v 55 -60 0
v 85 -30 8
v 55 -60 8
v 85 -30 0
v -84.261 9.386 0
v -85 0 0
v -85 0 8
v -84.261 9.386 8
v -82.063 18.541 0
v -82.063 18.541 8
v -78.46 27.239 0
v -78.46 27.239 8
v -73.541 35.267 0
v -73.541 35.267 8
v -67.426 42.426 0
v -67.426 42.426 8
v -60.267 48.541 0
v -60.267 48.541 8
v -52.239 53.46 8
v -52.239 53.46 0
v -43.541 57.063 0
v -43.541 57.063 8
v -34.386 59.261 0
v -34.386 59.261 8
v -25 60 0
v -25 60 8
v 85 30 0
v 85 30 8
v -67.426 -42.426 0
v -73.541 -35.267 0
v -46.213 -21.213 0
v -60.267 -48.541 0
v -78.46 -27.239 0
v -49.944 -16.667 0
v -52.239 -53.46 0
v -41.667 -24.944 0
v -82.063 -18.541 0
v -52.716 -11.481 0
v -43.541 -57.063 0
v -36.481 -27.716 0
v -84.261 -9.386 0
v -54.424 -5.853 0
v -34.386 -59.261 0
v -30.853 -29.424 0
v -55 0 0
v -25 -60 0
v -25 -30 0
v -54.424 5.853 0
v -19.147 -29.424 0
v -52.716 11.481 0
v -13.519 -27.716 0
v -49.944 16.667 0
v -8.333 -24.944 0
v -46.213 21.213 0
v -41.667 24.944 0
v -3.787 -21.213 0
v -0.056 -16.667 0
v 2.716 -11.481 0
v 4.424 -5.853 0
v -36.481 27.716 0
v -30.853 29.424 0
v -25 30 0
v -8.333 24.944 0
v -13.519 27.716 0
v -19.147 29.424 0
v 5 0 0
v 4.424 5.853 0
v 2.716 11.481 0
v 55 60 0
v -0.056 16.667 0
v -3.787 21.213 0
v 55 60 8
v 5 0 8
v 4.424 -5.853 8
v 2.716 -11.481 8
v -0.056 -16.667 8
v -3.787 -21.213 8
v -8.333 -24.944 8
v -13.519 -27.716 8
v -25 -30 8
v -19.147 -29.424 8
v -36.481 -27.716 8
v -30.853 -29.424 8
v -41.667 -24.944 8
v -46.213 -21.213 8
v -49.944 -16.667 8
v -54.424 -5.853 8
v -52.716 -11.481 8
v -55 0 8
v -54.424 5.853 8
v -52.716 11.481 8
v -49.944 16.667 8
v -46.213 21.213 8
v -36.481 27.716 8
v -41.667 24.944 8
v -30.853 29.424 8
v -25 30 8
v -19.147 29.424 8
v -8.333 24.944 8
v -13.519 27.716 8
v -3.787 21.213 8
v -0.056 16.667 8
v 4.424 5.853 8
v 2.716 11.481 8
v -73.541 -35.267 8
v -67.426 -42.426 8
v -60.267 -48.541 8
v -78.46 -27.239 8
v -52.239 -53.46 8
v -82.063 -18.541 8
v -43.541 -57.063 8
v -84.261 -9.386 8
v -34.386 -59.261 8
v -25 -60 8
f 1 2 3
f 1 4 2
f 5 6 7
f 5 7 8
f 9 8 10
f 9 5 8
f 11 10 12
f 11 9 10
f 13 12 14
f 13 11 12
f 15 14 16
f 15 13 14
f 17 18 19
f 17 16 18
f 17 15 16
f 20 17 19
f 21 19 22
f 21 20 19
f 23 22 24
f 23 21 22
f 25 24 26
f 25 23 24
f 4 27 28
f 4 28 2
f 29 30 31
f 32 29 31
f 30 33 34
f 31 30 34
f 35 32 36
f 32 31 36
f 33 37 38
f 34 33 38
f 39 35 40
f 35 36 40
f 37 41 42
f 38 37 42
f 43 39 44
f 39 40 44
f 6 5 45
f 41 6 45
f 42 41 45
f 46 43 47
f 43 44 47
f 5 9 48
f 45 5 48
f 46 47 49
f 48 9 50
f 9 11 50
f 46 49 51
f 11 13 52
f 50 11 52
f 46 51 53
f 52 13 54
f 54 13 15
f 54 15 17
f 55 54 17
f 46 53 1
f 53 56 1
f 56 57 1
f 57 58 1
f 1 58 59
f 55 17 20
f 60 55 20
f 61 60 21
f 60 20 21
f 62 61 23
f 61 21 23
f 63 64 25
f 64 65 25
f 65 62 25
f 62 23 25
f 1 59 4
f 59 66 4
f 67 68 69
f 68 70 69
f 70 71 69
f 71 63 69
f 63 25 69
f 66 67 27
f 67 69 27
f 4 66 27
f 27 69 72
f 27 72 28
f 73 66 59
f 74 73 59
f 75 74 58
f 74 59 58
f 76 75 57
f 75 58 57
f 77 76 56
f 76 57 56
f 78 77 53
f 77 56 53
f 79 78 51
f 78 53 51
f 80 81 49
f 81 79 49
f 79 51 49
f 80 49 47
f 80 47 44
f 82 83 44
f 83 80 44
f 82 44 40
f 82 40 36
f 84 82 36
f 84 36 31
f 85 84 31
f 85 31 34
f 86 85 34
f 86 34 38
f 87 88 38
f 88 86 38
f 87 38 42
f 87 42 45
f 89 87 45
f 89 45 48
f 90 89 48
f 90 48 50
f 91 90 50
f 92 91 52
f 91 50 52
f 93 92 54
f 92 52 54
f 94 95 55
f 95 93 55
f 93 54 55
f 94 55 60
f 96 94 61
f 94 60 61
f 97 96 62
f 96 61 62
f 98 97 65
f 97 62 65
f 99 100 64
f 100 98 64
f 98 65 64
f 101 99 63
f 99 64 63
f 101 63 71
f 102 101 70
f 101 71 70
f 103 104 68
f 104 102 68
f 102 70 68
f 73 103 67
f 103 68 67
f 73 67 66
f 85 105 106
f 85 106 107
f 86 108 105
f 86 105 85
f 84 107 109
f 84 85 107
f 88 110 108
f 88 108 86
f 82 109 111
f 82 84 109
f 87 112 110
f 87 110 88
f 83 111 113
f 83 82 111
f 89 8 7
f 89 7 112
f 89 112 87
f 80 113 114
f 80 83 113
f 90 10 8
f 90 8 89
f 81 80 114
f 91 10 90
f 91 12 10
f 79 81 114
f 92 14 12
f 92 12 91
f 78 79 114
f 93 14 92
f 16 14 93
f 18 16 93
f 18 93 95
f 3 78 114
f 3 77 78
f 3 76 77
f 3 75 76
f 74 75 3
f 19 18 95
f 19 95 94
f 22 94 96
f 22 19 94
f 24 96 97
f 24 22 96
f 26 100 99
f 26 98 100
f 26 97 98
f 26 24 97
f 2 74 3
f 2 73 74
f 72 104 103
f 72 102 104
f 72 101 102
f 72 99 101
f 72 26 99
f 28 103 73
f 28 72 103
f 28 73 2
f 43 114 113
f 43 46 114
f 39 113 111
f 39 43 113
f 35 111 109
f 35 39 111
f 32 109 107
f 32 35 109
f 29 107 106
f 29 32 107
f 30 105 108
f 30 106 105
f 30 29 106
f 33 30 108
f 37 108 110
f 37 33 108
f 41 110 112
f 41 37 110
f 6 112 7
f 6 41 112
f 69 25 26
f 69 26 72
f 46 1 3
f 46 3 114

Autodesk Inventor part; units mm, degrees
ref_plane "YZ Plane" through (0, 0, 0) normal (1, 0, 0) x (0, 1, 0)
ref_plane "XZ Plane" through (0, 0, 0) normal (0, 1, 0) x (-1, 0, 0)
ref_plane "XY Plane" through (0, 0, 0) normal (0, 0, 1) x (1, 0, 0)
sketch "Sketch1" plane through (0, 0, 0) normal (0, 0, 1) x (1, 0, 0)
  line L0 (-85, 60) -> (85, 60)
  line L1 (85, 60) -> (85, -60)
  line L2 (85, -60) -> (-85, -60)
  line L3 (-85, -60) -> (-85, 60)
  line L4 (-85, 60) -> (85, -60) construction
  line L5 (85, 60) -> (-85, -60) construction
  circle A0 centre (-25, 0) radius 30
  line L6 (0, 60) -> (0, -60) construction
  arc A1 (-25, 60) -> (-25, -60) centre (-25, 0) ccw
  line L7 (55, 60) -> (85, 30)
  line L8 (85, -30) -> (55, -60)
  point P0 (0, 0)
  point P1 (-85, 0)
  dimension "d0" = 170
  dimension "d1" = 120
  dimension "d13" = 60
  dimension "d14" = 60
  dimension "d15" = 30
  dimension "d17" = 45
extrude "Plate1" add sketch "Sketch1" along normal blind 8 contours L0 L7 L1 L8 L2 A1
equation "\"d2\" = Thickness"
equation "\"BendRadius\" = Thickness"
equation "\"BendReliefWidth\" = Thickness"
equation "\"BendReliefDepth\" = 0.5 * Thickness"
equation "\"CornerReliefSize\" = 4 * Thickness"
equation "\"MinimumRemnant\" = 2 * Thickness"
equation "\"TransitionRadius\" = BendRadius"
equation "\"JacobiRadiusSize\" = BendRadius"
equation "\"GapSize\" = Thickness"
equation "\"Thickness\" = 8"
properties part number "ухо"
